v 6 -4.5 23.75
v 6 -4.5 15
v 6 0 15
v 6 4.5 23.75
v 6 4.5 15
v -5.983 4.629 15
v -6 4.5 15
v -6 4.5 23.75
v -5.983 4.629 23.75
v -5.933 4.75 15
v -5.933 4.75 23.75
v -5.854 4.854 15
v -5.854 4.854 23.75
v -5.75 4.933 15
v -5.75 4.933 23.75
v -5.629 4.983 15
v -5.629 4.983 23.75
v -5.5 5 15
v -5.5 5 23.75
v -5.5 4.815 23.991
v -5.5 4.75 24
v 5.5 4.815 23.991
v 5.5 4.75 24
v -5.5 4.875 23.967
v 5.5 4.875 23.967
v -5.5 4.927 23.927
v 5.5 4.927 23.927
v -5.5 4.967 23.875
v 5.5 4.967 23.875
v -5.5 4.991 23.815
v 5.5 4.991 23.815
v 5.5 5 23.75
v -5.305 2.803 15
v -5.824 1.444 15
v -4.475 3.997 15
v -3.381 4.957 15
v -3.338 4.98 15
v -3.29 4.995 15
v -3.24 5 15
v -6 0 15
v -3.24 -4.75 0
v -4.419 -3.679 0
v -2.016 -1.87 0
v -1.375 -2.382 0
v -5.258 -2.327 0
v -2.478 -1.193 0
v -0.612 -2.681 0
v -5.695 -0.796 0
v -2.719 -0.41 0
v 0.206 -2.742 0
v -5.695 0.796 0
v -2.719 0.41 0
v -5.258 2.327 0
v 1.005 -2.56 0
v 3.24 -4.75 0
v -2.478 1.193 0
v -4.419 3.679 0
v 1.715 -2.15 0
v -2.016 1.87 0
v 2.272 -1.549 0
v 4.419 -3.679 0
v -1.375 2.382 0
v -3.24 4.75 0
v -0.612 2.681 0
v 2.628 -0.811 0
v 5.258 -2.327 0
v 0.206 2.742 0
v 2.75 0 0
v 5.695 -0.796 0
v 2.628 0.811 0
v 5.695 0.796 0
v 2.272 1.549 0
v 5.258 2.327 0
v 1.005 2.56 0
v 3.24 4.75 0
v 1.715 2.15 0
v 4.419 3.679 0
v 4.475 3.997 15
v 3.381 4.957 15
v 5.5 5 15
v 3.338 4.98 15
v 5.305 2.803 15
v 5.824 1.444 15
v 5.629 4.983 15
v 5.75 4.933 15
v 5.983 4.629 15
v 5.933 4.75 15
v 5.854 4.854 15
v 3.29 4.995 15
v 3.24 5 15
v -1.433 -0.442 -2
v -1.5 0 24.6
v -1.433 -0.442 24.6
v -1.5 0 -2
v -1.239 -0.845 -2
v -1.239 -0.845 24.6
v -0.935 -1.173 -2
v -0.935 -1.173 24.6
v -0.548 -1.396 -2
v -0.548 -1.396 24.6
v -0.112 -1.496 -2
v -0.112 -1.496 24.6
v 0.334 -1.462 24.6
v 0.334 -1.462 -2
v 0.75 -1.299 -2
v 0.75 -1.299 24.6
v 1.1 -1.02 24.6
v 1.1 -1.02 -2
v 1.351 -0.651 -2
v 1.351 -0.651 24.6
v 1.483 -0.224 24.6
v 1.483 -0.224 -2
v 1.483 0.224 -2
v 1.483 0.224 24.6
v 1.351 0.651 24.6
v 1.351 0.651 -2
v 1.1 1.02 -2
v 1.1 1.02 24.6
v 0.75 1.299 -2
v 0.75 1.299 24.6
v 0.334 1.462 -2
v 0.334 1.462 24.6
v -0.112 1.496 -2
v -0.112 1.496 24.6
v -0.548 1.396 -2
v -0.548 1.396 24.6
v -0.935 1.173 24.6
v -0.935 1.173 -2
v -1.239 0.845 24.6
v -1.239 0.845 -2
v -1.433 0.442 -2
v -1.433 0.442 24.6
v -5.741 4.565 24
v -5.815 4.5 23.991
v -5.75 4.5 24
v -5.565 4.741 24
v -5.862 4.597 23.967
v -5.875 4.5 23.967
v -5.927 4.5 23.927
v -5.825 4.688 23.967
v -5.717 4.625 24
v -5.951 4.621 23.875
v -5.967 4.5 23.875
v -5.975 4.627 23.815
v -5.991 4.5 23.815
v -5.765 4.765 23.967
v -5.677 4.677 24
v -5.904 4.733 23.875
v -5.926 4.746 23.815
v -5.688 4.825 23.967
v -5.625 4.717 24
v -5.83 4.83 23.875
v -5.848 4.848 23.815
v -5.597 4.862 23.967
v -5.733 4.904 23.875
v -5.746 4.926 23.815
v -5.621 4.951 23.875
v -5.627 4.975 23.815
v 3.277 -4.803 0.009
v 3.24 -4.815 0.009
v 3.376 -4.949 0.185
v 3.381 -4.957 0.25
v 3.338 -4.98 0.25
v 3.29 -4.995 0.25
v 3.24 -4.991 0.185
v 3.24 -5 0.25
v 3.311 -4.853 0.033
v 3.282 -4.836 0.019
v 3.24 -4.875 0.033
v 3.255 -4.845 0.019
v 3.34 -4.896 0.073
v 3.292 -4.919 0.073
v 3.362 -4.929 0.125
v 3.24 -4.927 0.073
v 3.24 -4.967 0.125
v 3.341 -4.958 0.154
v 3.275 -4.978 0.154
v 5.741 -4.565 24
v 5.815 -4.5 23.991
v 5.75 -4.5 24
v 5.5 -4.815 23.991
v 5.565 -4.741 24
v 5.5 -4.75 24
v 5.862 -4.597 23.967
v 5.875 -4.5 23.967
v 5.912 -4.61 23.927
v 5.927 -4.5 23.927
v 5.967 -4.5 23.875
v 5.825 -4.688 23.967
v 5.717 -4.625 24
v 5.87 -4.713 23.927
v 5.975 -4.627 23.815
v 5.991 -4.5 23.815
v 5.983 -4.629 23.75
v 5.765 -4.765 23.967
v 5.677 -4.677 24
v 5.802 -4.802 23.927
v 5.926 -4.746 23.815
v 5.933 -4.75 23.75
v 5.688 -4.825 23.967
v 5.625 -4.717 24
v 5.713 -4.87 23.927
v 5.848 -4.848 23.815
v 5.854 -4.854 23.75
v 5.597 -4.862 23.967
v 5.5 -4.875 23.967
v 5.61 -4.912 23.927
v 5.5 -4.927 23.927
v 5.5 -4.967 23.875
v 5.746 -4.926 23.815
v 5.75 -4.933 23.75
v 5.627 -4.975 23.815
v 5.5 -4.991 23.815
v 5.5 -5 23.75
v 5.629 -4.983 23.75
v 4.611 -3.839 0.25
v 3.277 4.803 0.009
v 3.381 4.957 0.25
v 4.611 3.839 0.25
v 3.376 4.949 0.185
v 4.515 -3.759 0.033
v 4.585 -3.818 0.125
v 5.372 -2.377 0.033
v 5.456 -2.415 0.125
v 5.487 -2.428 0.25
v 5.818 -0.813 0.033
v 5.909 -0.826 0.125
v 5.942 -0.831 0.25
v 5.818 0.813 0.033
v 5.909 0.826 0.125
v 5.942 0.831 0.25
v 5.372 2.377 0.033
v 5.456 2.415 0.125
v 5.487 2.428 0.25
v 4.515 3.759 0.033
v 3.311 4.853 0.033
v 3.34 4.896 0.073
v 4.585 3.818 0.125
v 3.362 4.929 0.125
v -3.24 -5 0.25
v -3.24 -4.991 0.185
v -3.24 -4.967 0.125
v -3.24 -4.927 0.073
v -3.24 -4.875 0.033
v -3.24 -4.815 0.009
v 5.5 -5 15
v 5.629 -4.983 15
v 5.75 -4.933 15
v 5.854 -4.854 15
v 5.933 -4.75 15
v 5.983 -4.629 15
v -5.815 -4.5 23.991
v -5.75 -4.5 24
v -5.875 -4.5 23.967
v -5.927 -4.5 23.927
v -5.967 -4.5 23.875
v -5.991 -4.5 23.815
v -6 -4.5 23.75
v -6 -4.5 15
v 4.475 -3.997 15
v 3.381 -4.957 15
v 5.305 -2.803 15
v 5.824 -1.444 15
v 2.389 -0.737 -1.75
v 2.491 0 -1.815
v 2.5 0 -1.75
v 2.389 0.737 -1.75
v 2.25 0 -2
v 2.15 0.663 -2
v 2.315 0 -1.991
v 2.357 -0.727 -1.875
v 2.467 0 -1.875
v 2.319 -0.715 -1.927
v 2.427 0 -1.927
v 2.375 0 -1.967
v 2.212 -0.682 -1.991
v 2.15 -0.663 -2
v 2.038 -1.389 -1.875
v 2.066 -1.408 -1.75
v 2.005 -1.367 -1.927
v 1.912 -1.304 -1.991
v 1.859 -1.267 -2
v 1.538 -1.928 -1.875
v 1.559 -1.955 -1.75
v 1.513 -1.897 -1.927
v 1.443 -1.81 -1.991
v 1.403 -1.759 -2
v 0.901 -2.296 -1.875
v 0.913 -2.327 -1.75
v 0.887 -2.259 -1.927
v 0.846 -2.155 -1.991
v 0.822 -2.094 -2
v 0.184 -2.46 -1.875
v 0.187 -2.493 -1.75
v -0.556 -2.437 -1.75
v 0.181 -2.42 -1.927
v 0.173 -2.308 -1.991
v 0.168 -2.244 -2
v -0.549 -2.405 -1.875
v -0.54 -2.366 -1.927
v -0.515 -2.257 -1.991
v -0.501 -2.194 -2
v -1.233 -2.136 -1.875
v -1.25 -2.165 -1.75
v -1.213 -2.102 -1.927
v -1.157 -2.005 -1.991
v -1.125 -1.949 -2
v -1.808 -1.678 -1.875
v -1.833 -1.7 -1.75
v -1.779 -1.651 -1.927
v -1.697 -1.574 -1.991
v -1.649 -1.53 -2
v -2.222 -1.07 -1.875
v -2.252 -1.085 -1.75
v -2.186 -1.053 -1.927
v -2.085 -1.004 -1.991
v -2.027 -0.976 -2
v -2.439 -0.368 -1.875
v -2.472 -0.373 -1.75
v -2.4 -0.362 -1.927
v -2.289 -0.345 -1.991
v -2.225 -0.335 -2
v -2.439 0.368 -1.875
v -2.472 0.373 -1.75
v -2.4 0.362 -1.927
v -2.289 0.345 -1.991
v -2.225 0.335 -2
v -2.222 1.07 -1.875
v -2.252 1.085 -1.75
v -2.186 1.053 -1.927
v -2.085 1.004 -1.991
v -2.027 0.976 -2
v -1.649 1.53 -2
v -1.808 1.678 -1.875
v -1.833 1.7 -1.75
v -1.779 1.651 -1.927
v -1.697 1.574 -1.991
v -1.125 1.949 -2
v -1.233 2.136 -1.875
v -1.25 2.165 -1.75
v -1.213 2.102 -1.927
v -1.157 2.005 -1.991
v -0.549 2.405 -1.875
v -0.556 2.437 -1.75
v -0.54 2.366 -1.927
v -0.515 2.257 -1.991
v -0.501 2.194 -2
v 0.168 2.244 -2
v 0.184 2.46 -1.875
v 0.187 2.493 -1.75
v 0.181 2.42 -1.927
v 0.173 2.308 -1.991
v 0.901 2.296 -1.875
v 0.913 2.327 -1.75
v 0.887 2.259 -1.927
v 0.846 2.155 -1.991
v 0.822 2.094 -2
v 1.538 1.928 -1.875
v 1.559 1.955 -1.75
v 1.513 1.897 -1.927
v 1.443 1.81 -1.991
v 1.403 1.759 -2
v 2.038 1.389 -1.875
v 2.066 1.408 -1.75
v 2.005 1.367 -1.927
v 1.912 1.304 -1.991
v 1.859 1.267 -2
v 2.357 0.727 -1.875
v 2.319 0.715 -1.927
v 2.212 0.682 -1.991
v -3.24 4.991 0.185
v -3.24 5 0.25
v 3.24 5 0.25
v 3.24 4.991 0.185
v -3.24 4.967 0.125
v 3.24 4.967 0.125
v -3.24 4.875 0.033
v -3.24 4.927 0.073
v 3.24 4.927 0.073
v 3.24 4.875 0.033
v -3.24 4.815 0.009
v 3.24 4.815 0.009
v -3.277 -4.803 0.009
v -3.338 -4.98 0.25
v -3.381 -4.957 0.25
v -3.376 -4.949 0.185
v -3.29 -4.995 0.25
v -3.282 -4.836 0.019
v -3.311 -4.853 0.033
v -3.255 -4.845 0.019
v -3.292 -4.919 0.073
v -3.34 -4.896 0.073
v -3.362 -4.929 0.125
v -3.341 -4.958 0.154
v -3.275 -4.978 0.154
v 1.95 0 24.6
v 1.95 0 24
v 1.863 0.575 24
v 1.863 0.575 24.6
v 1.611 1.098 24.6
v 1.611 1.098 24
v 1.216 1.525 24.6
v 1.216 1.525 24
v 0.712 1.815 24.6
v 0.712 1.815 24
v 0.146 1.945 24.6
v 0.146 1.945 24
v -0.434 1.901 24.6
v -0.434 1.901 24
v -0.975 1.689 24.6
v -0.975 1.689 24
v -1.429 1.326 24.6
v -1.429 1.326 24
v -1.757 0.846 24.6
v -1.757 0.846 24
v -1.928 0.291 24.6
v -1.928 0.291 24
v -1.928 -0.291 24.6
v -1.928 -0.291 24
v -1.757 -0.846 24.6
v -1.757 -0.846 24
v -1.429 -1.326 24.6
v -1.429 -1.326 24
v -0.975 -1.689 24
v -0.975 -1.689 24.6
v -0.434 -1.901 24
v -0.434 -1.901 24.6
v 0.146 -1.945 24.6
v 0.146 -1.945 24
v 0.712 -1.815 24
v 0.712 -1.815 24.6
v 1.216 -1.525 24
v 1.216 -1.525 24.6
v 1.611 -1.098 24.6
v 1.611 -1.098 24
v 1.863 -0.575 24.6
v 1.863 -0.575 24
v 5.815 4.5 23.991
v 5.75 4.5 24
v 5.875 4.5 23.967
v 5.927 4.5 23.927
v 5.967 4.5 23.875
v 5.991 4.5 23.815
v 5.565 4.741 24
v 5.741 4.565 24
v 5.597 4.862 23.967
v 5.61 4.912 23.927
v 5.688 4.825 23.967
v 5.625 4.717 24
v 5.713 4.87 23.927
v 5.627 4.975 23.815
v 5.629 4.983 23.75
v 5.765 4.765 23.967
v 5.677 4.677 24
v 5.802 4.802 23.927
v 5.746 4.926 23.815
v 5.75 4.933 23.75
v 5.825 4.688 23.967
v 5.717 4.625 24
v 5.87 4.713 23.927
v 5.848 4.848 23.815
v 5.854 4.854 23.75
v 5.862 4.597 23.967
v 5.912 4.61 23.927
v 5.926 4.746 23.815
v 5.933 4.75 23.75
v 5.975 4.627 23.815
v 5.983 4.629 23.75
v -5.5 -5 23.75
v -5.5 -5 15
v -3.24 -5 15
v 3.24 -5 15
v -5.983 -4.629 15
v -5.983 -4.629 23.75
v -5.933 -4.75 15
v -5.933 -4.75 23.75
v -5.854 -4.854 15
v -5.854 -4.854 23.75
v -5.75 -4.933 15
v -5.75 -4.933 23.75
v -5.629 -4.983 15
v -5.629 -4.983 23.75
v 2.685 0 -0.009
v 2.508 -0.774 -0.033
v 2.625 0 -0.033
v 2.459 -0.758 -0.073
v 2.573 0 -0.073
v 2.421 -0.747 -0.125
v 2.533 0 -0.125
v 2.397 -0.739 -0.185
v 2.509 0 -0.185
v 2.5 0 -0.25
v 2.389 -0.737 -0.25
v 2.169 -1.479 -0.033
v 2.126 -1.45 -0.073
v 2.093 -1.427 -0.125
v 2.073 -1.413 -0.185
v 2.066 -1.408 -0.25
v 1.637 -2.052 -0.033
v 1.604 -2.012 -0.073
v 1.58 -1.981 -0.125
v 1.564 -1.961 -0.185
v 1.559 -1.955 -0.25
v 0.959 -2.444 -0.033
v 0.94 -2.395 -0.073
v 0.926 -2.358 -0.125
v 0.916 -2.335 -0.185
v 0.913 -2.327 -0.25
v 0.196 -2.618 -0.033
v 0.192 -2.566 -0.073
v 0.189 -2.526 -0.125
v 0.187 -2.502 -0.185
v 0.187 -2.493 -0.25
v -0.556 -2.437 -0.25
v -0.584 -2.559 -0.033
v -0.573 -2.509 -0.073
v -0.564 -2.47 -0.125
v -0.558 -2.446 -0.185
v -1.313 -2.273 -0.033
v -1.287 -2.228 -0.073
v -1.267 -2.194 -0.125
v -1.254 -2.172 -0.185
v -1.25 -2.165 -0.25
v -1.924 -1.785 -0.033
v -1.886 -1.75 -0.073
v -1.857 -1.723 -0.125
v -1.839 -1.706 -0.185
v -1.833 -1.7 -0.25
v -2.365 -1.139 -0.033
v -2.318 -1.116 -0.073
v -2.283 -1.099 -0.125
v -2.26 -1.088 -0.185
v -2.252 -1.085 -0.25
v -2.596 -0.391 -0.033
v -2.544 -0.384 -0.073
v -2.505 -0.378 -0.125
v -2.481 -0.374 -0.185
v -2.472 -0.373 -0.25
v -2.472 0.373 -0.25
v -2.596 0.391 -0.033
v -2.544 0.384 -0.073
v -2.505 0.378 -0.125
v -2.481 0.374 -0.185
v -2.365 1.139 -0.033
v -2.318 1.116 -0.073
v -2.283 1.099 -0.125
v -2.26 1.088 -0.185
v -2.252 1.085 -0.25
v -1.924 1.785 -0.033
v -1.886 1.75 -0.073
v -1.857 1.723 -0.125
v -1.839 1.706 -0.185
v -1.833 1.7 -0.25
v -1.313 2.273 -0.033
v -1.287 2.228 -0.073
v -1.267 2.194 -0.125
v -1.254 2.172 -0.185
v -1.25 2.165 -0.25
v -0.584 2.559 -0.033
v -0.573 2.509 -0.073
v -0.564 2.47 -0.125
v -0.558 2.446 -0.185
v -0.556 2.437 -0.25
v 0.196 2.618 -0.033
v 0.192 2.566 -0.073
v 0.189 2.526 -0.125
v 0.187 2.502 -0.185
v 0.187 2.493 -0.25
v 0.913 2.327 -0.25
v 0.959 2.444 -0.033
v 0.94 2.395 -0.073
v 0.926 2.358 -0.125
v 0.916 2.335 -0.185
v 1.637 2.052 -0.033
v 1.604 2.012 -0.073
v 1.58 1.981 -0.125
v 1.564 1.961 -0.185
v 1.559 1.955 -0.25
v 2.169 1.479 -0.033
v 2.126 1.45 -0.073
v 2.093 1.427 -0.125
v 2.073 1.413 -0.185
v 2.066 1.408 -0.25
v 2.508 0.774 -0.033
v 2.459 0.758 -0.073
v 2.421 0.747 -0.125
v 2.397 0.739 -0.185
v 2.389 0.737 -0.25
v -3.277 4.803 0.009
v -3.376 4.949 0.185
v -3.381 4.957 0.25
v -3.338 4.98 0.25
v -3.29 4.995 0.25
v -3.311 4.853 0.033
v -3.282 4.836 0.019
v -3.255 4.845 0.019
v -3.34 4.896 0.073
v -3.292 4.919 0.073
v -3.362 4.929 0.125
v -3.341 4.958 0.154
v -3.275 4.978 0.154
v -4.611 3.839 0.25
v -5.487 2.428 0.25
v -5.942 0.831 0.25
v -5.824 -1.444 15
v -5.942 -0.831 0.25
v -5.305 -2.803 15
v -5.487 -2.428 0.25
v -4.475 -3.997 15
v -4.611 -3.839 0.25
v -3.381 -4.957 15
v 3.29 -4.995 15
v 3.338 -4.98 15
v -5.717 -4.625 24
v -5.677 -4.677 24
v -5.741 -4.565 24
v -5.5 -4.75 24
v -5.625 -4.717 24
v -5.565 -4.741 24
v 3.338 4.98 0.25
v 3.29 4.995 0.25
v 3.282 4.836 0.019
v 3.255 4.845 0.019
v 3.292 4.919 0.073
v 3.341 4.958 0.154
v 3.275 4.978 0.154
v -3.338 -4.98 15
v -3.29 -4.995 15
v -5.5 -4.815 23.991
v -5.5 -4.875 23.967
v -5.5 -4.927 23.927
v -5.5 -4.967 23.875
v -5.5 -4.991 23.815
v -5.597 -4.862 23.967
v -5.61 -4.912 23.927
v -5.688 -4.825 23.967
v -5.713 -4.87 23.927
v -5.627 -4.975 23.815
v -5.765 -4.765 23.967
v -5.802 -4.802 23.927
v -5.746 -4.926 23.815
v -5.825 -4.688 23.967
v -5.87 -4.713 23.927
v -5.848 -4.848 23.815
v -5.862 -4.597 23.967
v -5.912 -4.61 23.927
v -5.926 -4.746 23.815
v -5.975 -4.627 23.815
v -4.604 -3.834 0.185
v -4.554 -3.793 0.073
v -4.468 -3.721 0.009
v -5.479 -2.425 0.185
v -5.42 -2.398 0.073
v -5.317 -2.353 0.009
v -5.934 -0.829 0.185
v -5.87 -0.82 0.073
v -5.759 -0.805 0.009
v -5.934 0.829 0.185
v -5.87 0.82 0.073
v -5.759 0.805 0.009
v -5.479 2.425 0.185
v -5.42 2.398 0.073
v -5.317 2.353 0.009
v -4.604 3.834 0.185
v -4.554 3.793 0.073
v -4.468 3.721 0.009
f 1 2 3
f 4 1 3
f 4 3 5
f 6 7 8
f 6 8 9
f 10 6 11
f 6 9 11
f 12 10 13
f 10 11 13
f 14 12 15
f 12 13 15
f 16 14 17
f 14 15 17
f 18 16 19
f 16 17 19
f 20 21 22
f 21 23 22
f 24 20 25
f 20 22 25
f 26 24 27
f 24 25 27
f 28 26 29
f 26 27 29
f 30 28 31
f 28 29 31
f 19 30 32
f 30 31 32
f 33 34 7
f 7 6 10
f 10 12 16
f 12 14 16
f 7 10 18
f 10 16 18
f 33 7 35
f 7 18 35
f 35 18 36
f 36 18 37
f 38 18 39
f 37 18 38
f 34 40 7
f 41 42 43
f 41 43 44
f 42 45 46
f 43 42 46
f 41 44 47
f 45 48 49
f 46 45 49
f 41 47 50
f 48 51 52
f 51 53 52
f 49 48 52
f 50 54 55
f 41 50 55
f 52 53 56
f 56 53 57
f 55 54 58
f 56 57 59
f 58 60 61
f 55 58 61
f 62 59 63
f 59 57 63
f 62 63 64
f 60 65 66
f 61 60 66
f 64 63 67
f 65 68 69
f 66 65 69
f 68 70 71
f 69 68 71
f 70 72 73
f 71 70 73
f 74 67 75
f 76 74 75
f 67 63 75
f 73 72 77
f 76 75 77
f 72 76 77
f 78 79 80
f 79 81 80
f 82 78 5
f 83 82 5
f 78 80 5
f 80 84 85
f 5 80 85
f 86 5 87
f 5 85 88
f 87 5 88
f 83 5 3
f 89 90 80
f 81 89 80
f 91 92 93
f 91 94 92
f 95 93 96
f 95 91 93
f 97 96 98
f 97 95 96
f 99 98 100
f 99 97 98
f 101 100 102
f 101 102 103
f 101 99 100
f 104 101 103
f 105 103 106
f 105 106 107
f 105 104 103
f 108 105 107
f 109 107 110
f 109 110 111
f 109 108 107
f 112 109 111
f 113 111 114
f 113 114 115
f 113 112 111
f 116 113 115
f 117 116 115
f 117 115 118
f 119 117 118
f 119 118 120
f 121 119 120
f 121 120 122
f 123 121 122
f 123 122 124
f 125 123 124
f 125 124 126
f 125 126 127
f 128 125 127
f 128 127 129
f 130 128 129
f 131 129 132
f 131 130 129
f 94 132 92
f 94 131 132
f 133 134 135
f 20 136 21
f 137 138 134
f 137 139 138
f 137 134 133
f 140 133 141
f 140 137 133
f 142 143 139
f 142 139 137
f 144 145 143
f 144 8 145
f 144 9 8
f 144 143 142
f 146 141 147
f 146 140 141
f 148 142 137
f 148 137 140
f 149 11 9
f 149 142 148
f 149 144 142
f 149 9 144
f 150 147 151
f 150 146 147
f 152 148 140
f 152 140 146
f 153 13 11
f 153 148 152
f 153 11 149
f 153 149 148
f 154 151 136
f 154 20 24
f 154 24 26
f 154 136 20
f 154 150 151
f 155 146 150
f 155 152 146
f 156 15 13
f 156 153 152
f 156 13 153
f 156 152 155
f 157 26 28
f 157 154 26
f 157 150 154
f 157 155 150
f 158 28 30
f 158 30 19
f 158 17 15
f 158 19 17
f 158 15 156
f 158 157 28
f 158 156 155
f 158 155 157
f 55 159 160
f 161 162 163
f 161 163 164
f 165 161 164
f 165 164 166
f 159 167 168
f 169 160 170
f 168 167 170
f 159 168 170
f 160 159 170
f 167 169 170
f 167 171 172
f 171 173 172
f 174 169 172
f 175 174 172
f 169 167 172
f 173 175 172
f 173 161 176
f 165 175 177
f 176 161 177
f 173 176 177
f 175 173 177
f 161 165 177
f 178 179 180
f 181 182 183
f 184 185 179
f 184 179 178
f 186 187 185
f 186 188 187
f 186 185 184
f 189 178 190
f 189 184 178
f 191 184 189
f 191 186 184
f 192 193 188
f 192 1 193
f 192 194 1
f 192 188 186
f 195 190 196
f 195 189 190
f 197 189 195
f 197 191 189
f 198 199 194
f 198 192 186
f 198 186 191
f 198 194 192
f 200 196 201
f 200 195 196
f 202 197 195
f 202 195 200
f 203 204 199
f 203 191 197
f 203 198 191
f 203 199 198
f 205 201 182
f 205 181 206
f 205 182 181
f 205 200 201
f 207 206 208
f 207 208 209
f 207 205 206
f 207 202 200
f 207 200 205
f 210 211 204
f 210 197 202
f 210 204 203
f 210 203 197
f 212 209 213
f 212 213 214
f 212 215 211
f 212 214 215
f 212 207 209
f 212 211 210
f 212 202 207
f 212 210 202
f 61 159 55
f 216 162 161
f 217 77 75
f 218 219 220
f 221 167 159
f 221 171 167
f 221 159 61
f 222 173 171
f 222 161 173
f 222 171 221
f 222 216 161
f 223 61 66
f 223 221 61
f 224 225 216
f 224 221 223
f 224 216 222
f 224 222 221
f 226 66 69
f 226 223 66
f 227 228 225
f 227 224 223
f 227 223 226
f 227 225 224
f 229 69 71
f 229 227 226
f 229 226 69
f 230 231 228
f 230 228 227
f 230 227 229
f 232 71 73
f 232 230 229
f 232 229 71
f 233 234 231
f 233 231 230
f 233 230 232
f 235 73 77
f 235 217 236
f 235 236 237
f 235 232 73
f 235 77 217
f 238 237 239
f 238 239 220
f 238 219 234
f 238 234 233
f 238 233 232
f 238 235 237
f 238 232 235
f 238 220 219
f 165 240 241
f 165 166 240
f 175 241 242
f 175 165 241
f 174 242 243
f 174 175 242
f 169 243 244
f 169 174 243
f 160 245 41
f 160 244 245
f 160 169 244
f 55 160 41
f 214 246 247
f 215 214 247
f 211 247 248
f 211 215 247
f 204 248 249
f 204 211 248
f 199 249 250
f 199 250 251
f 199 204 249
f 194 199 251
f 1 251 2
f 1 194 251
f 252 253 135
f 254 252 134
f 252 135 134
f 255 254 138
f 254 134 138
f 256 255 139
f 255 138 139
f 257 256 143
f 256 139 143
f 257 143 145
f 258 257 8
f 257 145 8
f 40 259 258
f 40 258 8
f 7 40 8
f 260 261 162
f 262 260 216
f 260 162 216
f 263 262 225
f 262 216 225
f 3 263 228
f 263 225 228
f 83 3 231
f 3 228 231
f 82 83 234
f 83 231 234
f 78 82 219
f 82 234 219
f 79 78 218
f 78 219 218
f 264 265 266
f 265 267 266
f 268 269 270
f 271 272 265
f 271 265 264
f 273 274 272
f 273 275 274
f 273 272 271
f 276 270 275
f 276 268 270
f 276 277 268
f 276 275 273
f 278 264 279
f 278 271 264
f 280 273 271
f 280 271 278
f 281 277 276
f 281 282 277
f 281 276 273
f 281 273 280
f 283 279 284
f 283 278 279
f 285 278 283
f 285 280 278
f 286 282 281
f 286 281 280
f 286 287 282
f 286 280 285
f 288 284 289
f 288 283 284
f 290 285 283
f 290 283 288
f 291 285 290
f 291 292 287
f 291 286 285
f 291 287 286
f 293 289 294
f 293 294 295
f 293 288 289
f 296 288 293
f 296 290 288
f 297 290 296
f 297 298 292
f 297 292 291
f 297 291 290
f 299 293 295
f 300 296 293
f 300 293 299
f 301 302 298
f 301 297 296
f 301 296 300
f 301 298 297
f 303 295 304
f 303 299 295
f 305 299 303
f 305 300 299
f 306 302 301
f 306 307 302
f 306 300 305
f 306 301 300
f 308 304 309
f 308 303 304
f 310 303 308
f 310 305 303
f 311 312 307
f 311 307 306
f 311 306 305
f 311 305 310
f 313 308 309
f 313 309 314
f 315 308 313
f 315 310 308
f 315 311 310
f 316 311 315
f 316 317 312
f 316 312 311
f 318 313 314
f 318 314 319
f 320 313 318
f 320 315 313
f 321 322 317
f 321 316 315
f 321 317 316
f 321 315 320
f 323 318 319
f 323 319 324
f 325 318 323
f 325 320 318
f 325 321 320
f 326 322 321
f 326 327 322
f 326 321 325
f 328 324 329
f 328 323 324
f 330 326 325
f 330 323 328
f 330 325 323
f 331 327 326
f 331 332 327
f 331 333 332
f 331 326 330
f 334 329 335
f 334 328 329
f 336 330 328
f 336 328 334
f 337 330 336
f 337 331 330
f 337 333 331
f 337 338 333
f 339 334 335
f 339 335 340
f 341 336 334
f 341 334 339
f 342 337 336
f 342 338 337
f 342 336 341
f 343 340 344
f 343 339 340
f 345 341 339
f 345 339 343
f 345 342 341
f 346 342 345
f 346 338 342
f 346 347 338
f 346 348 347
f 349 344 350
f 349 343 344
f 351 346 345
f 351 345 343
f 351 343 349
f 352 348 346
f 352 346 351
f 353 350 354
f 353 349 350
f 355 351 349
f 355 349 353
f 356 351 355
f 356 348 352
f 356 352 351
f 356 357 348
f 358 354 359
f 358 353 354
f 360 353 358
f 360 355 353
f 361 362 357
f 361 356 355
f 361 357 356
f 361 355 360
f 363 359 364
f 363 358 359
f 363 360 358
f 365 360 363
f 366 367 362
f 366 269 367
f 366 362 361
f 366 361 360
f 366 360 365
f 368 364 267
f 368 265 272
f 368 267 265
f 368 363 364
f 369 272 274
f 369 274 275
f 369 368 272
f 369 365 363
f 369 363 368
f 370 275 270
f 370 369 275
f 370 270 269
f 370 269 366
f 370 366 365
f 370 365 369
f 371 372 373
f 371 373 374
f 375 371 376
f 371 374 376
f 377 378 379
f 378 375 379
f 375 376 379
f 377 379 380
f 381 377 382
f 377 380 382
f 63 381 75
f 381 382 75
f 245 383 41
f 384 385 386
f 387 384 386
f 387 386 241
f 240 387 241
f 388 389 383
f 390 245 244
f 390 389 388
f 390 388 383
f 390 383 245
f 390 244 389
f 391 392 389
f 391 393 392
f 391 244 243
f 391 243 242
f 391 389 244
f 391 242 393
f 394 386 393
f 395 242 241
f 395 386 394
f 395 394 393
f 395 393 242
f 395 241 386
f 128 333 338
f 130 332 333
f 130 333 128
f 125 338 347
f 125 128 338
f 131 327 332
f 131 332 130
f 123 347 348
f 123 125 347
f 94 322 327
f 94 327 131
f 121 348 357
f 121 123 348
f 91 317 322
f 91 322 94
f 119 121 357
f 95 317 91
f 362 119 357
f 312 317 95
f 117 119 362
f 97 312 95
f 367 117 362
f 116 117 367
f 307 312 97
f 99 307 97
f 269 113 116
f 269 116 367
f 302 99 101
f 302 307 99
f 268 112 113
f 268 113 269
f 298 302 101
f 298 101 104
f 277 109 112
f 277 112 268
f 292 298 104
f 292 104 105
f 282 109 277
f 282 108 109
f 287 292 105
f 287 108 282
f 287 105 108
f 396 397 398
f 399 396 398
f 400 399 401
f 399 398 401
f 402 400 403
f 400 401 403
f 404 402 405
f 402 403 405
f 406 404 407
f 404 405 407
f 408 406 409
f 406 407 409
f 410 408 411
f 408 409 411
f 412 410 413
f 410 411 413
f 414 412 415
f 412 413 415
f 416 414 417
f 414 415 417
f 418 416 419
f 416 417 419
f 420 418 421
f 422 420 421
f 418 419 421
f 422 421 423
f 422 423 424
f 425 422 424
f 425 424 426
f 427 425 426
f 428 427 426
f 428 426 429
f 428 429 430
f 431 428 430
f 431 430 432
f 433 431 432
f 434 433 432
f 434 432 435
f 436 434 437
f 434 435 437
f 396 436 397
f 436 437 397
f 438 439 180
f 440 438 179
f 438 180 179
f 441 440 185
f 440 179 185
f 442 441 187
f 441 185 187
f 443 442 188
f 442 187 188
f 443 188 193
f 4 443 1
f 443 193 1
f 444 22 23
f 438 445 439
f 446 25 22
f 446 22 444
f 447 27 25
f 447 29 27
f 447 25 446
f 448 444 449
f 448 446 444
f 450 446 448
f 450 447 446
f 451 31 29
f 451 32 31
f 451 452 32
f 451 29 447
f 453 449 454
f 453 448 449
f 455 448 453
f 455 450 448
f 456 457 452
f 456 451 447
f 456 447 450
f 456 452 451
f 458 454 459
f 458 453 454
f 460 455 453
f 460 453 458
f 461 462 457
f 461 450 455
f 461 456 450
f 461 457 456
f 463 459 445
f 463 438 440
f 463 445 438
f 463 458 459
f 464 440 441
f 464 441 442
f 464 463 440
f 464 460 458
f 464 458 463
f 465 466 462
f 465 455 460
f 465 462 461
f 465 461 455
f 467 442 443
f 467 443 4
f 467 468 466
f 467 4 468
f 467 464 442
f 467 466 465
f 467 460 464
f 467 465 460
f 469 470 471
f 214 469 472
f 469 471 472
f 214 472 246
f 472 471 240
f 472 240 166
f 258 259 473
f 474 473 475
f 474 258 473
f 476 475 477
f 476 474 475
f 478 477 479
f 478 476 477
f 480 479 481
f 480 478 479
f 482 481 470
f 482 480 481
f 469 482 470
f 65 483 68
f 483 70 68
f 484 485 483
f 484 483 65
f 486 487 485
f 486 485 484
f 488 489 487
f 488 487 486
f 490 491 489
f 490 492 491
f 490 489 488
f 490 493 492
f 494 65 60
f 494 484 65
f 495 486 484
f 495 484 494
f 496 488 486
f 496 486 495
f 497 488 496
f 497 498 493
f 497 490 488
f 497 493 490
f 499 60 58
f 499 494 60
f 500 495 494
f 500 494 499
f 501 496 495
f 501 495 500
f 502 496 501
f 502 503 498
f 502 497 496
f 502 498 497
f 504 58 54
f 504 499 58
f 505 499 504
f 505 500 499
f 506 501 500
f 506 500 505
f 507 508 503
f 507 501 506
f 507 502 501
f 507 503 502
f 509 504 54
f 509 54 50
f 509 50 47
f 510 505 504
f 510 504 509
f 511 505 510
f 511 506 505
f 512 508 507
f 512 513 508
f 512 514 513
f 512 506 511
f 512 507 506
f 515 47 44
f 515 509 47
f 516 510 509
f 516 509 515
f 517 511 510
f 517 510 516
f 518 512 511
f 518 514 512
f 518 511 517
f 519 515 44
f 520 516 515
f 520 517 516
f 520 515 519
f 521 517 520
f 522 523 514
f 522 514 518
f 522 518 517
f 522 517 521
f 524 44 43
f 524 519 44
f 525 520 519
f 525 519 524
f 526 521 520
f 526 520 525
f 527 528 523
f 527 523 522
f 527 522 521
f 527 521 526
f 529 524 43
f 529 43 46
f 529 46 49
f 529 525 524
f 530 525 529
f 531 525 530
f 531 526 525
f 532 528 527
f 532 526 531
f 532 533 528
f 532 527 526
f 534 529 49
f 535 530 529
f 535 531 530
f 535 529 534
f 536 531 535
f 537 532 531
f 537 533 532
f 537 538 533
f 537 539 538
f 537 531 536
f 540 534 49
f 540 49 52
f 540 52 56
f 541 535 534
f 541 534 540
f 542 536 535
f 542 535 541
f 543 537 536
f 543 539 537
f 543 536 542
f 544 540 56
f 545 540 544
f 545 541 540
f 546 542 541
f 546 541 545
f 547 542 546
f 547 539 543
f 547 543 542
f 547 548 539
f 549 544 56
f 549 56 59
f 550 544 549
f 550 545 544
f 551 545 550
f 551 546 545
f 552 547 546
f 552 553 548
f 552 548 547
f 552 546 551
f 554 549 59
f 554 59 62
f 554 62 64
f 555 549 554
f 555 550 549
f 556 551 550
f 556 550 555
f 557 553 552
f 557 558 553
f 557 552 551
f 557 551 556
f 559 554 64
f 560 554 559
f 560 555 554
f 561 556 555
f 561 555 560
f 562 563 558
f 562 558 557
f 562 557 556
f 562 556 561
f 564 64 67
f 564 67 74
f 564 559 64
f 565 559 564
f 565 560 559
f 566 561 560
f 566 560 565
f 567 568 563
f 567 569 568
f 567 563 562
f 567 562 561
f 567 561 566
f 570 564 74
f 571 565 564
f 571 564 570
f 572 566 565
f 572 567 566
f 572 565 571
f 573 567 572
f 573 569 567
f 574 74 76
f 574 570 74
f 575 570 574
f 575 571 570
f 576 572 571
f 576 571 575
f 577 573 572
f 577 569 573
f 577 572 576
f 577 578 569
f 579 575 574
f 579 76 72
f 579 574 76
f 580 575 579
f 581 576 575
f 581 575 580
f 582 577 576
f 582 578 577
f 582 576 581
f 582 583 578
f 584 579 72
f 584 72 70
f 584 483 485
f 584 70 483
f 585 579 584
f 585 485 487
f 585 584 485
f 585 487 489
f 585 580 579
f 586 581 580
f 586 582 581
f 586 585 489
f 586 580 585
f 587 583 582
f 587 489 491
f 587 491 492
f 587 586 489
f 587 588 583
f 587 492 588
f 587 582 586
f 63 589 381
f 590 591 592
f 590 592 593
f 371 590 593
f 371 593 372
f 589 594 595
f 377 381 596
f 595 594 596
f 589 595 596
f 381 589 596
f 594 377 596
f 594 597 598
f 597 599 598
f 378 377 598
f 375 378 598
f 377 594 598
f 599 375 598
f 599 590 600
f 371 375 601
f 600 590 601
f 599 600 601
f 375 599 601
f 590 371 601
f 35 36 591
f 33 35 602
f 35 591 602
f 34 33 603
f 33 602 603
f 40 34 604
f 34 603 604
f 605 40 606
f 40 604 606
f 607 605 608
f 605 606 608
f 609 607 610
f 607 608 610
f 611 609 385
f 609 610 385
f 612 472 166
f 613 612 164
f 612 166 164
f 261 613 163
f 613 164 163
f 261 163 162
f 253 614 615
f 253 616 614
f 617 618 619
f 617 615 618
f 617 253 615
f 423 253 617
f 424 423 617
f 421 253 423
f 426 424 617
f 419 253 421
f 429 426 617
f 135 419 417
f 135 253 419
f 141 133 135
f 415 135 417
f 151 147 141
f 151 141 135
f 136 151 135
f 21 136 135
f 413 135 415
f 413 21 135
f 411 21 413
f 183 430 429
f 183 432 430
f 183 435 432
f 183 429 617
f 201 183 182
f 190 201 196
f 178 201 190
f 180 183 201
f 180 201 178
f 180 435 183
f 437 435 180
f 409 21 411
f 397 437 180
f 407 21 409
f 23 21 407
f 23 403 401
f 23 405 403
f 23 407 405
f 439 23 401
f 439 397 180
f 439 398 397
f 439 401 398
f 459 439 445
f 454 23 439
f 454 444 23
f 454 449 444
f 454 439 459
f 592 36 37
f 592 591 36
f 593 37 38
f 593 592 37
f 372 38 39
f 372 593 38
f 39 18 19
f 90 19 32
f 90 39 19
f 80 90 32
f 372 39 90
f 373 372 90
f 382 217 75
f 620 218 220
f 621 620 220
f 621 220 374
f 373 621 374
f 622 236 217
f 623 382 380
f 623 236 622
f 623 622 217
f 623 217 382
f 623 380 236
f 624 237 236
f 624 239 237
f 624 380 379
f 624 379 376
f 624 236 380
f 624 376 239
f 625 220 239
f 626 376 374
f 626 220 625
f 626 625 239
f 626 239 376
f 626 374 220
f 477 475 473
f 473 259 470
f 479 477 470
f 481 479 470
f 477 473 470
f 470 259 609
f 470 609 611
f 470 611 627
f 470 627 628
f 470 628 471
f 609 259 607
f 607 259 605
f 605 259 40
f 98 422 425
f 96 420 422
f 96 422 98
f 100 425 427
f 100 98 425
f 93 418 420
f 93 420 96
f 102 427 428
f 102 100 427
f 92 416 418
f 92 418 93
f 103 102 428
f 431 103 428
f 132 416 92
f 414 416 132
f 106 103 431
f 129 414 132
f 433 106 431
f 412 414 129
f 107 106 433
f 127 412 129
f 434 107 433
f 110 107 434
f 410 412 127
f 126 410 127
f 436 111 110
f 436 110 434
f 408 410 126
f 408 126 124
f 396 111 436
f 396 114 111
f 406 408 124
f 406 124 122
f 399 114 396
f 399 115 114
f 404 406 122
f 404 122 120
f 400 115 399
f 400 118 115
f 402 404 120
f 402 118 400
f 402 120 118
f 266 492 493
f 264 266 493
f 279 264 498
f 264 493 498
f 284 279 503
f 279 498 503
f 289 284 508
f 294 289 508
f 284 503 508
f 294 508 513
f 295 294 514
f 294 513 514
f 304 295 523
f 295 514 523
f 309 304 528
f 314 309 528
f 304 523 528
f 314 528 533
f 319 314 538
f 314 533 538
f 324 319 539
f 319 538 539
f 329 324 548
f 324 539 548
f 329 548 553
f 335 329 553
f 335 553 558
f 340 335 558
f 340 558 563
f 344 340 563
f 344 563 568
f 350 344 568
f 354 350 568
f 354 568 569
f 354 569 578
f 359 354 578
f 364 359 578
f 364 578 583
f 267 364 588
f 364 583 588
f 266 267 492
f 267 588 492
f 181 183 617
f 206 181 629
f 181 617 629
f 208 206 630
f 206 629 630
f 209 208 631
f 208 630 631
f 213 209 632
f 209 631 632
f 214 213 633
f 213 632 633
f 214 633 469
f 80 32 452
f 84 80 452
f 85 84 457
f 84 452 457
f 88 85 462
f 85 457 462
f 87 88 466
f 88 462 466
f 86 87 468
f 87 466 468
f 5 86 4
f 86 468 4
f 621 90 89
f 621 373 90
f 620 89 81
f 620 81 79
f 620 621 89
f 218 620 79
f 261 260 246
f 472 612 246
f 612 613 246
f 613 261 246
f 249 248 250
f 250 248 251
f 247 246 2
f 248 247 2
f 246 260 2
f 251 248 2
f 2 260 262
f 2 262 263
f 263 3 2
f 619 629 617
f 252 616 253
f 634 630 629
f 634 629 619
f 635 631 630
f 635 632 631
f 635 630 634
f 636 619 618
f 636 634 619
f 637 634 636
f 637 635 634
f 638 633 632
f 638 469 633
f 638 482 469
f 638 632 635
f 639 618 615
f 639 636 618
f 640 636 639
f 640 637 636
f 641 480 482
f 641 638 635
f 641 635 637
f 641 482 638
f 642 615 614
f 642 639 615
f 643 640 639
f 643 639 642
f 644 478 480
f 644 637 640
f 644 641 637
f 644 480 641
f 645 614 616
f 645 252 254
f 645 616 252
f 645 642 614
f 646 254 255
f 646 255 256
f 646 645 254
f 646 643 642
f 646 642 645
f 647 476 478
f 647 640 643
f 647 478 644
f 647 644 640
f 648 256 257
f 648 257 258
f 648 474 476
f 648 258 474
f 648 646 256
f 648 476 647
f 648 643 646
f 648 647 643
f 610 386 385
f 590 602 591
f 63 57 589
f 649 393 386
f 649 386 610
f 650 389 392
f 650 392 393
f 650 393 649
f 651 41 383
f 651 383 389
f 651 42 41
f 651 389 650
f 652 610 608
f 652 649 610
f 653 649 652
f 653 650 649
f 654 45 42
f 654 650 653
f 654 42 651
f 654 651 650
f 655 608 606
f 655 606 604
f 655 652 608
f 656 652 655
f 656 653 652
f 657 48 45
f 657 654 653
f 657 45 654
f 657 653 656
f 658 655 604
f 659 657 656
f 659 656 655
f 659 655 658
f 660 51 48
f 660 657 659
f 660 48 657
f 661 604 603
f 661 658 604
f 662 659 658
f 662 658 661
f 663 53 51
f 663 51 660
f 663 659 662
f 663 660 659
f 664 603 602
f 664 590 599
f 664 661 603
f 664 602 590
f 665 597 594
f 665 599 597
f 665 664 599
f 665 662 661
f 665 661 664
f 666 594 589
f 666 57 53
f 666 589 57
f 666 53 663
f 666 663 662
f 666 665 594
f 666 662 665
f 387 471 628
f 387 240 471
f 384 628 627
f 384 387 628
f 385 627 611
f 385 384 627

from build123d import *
from build123d.topology import SkipClean

# Parameters (mm, degrees)
SKETCH_1_R           = 6
EXTRUDE_1_DEPTH      = 15
SKETCH_2_OUTSIDE_W   = 18.53
SKETCH_2_OUTSIDE_H   = 18.53
SKETCH_2_OUTSIDE_W_2 = 12
SKETCH_2_OUTSIDE_H_2 = 10
CUT_EXTRUDE_3_DEPTH  = 15
SKETCH_2_3_W         = 12
SKETCH_2_3_H         = 10
EXTRUDE_2_DEPTH      = 9
FILLET_1_R           = 0.5
SKETCH_4_R           = 2.5
EXTRUDE_3_DEPTH      = 2
SKETCH_5_R           = 1.5
CUT_EXTRUDE_4_DEPTH  = 28.147743921
FILLET_2_R           = 0.25
FILLET_3_R           = 0.25
SKETCH_6_R           = 1.95
SKETCH_6_R_2         = 1.5
EXTRUDE_4_DEPTH      = 0.6


with BuildPart() as part:
    # Эскиз1 → Бобышка-Вытянуть1 (new body)
    with BuildSketch(Plane.XY):
        Circle(SKETCH_1_R)
    extrude(amount=EXTRUDE_1_DEPTH)

    # Эскиз2 outside → Вырез-Вытянуть3 (cut)
    with BuildSketch(Plane.XY.offset(15)):
        Rectangle(SKETCH_2_OUTSIDE_W, SKETCH_2_OUTSIDE_H)
        Rectangle(SKETCH_2_OUTSIDE_W_2, SKETCH_2_OUTSIDE_H_2, mode=Mode.SUBTRACT)
    extrude(amount=-CUT_EXTRUDE_3_DEPTH, mode=Mode.SUBTRACT)

    # Эскиз2<3> → Бобышка-Вытянуть2 (add)
    with BuildSketch(Plane.XY.offset(15)):
        Rectangle(SKETCH_2_3_W, SKETCH_2_3_H)
    extrude(amount=EXTRUDE_2_DEPTH)

    # Скругление1
    fillet_1_edges = [part.edges().sort_by_distance(p)[0] for p in [
        (6, 5, 19.5),
        (-6, 5, 19.5),
        (-6, -5, 19.5),
        (6, -5, 19.5),
    ]]
    fillet(fillet_1_edges, radius=FILLET_1_R)

    # Эскиз4 → Бобышка-Вытянуть3 (add)
    with BuildSketch(Plane(origin=(0, 0, 0), x_dir=(-1, 0, 0), z_dir=(0, 0, -1))):
        Circle(SKETCH_4_R)
    extrude(amount=EXTRUDE_3_DEPTH)

    # Эскиз5 → Вырез-Вытянуть4 (cut, through all)
    with BuildSketch(Plane(origin=(0, 0, -2), x_dir=(-1, 0, 0), z_dir=(0, 0, -1))):
        Circle(SKETCH_5_R)
    extrude(amount=-CUT_EXTRUDE_4_DEPTH, mode=Mode.SUBTRACT)

    # Скругление2
    fillet_2_edges = [part.edges().sort_by_distance(p)[0] for p in [
        (5.853553391, 4.853553391, 24),
        (6, 0, 24),
        (5.853553391, -4.853553391, 24),
        (0, -5, 24),
        (-5.853553391, -4.853553391, 24),
        (-6, 0, 24),
        (-5.853553391, 4.853553391, 24),
        (0, 5, 24),
    ]]
    fillet(fillet_2_edges, radius=FILLET_2_R)

    # Скругление3
    fillet_3_edges = [part.edges().sort_by_distance(p)[0] for p in [
        (2.5, 0, -2),
        (2.5, 0, 0),
        (3.31662479, -5, 7.5),
        (-3.31662479, -5, 7.5),
        (-3.31662479, 5, 7.5),
        (3.31662479, 5, 7.5),
        (6, 0, 0),
        (-6, 0, 0),
        (0, -5, 0),
        (0, 5, 0),
    ]]
    fillet(fillet_3_edges, radius=FILLET_3_R)

    # Эскиз6 → Бобышка-Вытянуть4 (add)
    with SkipClean():  # the faces are left unmerged after this step: merging them gives an invalid solid
        with BuildSketch(Plane.XY.offset(24)):
            Circle(SKETCH_6_R)
            Circle(SKETCH_6_R_2, mode=Mode.SUBTRACT)
        extrude(amount=EXTRUDE_4_DEPTH)


solid = part.part
